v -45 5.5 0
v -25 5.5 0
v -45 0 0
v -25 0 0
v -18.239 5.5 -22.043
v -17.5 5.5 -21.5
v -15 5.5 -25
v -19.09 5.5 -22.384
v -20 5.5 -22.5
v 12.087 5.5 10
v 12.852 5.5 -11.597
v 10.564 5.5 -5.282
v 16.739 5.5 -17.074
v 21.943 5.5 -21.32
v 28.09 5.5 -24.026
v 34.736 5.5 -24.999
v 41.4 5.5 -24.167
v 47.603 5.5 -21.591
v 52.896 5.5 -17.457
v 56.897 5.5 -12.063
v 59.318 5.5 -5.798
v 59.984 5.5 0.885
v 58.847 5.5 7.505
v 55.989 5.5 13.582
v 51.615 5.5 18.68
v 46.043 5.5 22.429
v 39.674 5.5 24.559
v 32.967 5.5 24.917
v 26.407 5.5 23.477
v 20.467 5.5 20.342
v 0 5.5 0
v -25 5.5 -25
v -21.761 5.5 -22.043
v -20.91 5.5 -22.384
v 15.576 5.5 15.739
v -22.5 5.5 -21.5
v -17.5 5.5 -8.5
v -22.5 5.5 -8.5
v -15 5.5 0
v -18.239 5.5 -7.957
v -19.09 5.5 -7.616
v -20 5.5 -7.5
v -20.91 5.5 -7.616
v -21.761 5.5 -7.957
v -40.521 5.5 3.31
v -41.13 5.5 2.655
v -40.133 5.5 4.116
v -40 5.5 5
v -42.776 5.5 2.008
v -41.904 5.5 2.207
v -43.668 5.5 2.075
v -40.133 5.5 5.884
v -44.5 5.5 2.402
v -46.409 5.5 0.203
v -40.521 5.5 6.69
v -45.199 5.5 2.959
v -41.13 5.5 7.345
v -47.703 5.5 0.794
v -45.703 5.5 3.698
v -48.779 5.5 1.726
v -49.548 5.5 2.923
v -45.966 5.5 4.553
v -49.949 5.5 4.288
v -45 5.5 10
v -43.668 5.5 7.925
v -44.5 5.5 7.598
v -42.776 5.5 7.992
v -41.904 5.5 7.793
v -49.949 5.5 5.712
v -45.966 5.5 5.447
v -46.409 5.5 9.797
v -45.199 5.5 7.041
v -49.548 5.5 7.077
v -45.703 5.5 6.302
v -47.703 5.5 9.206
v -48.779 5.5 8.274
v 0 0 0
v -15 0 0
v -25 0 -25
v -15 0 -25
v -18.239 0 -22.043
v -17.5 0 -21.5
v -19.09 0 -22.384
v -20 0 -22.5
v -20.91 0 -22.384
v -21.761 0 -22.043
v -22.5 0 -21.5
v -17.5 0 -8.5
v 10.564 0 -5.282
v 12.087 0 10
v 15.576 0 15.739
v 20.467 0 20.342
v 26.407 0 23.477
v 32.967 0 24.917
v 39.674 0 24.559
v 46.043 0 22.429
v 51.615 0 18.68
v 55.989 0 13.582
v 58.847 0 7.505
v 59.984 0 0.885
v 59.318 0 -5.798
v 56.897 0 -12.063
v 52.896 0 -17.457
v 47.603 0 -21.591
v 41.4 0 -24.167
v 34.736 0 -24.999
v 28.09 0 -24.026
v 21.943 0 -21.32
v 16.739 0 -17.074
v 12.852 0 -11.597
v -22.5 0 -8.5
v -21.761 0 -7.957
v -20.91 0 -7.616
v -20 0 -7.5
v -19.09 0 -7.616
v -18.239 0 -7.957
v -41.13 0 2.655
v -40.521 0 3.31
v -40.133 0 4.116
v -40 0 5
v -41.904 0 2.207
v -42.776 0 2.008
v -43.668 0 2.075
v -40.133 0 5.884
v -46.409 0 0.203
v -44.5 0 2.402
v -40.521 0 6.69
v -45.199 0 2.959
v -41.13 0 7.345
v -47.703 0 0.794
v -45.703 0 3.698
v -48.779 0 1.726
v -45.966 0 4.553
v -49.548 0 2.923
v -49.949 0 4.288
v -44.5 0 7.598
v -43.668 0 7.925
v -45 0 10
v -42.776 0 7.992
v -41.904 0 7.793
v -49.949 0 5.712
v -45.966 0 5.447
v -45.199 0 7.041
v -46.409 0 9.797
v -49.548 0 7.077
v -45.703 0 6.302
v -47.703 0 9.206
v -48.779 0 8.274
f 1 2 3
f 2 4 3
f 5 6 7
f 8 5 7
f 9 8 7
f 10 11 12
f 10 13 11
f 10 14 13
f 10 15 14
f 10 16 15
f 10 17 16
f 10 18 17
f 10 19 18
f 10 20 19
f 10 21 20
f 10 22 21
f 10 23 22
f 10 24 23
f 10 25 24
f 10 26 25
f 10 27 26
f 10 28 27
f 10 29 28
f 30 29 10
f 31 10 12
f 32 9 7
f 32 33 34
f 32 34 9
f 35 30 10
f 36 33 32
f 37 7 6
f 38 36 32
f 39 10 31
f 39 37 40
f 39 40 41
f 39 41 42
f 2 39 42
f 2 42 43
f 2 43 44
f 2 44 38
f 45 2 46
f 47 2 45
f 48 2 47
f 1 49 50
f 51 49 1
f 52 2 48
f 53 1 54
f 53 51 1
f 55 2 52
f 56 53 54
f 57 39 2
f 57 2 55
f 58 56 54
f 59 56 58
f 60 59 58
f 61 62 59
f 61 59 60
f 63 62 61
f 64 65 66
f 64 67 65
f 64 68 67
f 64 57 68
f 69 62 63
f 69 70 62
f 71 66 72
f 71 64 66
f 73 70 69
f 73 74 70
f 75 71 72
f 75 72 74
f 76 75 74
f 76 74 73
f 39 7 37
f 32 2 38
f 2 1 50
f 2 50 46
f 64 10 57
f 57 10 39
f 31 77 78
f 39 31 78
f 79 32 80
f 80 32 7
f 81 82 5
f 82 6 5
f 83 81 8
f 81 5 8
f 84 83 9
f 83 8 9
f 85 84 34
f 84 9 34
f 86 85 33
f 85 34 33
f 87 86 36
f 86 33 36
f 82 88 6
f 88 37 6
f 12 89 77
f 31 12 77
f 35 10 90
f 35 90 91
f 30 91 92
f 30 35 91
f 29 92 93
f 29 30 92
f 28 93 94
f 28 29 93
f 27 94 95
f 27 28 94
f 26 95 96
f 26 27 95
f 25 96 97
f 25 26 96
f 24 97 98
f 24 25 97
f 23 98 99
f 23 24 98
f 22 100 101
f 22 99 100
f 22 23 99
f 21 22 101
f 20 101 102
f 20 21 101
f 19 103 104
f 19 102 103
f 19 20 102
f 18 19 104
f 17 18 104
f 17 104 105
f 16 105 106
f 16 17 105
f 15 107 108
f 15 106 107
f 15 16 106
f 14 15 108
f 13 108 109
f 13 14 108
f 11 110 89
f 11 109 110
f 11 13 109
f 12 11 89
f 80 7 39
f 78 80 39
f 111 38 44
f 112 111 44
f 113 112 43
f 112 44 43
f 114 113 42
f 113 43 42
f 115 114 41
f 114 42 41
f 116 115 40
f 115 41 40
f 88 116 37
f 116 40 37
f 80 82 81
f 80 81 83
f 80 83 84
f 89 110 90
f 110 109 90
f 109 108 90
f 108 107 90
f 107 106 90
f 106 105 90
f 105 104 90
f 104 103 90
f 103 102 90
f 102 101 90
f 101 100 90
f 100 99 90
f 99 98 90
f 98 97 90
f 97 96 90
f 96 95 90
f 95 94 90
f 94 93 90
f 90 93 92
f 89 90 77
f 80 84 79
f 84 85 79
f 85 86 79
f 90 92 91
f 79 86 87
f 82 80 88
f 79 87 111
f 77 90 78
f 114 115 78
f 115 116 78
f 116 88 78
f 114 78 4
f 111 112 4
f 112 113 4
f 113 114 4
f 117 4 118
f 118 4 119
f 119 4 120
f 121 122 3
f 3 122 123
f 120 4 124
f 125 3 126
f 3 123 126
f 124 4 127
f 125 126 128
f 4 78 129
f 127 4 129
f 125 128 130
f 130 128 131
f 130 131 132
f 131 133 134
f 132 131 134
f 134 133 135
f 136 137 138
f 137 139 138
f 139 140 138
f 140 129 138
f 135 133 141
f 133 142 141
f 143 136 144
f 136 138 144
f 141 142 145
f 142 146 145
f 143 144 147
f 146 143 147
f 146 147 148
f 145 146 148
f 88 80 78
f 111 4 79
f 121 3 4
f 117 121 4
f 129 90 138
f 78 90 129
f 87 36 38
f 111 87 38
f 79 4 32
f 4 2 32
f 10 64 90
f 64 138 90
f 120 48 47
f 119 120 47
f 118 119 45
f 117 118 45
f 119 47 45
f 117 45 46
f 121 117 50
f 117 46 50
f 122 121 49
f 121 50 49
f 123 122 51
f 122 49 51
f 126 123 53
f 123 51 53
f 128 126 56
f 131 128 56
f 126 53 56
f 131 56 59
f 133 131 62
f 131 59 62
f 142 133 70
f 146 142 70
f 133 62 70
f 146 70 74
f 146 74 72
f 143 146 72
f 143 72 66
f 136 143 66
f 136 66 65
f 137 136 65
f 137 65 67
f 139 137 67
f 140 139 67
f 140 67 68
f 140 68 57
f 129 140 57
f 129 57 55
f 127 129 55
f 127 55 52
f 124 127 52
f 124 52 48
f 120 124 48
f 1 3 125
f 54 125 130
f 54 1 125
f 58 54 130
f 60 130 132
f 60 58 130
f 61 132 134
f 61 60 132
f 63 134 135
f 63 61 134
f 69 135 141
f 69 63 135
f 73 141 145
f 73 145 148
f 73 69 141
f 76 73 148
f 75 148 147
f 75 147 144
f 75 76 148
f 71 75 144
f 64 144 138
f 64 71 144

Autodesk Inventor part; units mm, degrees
ref_plane "YZ Plane" through (0, 0, 0) normal (1, 0, 0) x (0, 1, 0)
ref_plane "XZ Plane" through (0, 0, 0) normal (0, 1, 0) x (-1, 0, 0)
ref_plane "XY Plane" through (0, 0, 0) normal (0, 0, 1) x (1, 0, 0)
sketch "Boceto1" plane through (0, 0, 0) normal (0, 1, 0) x (-1, 0, 0)
  line L0 (50, 10) -> (-50, 10)
  line L1 (-50, 10) -> (-50, -10)
  line L2 (-50, -10) -> (50, -10)
  line L3 (50, -10) -> (50, 10)
  line L4 (50, 10) -> (-50, -10) construction
  line L5 (-50, 10) -> (50, -10) construction
  line L6 (-50, -10) -> (-20, -10)
  line L7 (-20, -10) -> (0, 0)
  line L8 (0, 0) -> (50, 0)
  line L9 (0, 0) -> (0, 10)
  dimension "d0" = 100
  dimension "d1" = 20
  dimension "d2" = 30
extrude "Extrusión1" add sketch "Boceto1" along normal blind 5.5 contours L3 L8 L9 L0
extrude "Extrusión2" add sketch "Boceto1" along normal blind 5.5 contours L9 L7 L2 L1 L0
sketch "Boceto2" plane through (0, 5.5, 0) normal (0, 1, 0) x (1, 0, 0)
  line L0 (-50, 0) -> (-50, -10) projected
  line L1 (-50, -10) -> (-45, -10)
  line L2 (-50, -10) -> (50, -10) projected
  line L3 (-45, -10) -> (-45, 0)
  line L4 (0, 0) -> (-50, 0) projected
  arc A0 (-45, 0) -> (-45, -10) centre (-45, -5) ccw
  line L5 (-50, -5) -> (-25, -5)
  line L6 (-25, -5) -> (-25, 25)
  line L7 (-25, 25) -> (-15, 25)
  line L8 (-15, 25) -> (-15, -5)
  line L9 (-15, -5) -> (-25, -5)
  line L10 (-20, 25) -> (-20, 5)
  line L11 (-22.5, 7.5) -> (-17.5, 7.5)
  line L12 (-17.5, 7.5) -> (-17.5, 22.5)
  line L13 (-17.5, 22.5) -> (-22.5, 22.5)
  line L14 (-22.5, 22.5) -> (-22.5, 7.5)
  line L15 (-22.5, 7.5) -> (-17.5, 22.5) construction
  line L16 (-17.5, 7.5) -> (-22.5, 22.5) construction
  line L17 (-22.5, 22.5) -> (-22.5, 21.5)
  line L18 (-22.5, 21.5) -> (-17.5, 21.5)
  line L19 (-22.5, 15) -> (-17.5, 15)
  arc A1 (-17.5, 21.5) -> (-22.5, 21.5) centre (-20, 18.875) ccw
  arc A2 (-22.5, 8.5) -> (-17.5, 8.5) centre (-20, 11.125) ccw
  line L20 (-25, -5) -> (-20, -5)
  line L21 (-20, -5) -> (-20, -10)
  line L22 (-20, -10) -> (-25, -10)
  line L23 (-25, -10) -> (-25, -5)
  point P0 (0, -10)
  point P1 (-20, 15)
  point P2 (-50, -5)
  point P3 (-25, 0)
  point P4 (-15, 0)
  point P5 (-20, 22.5)
  point P6 (-20, 7.5)
  point P7 (-22.5, 8.5)
  point P8 (-17.5, 8.5)
  point P9 (-20, -5)
  dimension "d7" = 5
  dimension "d8" = 25
  dimension "d9" = 30
  dimension "d10" = 10
  dimension "d11" = 20
  dimension "d12" = 5
  dimension "d13" = 15
  dimension "d14" = 1
extrude "Extrusión3" cut sketch "Boceto2" against normal blind 5.5 contours L4 A0 L0 | A0 L1 L0
extrude "Extrusión4" add sketch "Boceto2" against normal blind 5.5 contours L6 L7 L8 L4 | L4 L8 L9 L6
extrude "Extrusión5" add sketch "Boceto2" against normal blind 5.5 contours A1 L14 L13 | L13 L12 A1 | A2 L12 L11 | L11 L14 A2
sketch "Boceto3" plane through (0, 5.5, 0) normal (0, 1, 0) x (1, 0, 0)
  arc A0 (-45, 0) -> (-45, -10) centre (-45, -5) ccw projected
  line L0 (-45, -5) -> (-43, -5)
  circle A1 centre (-43, -5) radius 3
  point P0 (0, 0)
  dimension "d21" = 2
  dimension "d22" = 6
extrude "Extrusión6" cut sketch "Boceto3" against normal blind 5.5
sketch "Boceto4" plane through (0, 5.5, 0) normal (0, 1, 0) x (1, 0, 0)
  line L0 (0, 0) -> (50, 0)
  line L1 (50, -10) -> (50, 10) projected
  line L2 (50, 10) -> (20, 10) projected
  line L3 (20, 10) -> (20, 0)
  line L4 (50, 0) -> (20, 0)
  circle A0 centre (35, 0) radius 25
  dimension "d27" = 50
extrude "Extrusión7" add sketch "Boceto4" against normal blind 5.5
sketch "Boceto5" plane through (0, 5.5, 0) normal (0, 1, 0) x (1, 0, 0)
  line L0 (-22.5, 8.5) -> (-22.5, 21.5) projected
  arc A0 (-22.5, 8.5) -> (-17.5, 8.5) centre (-20, 11.125) ccw projected
  line L1 (-17.5, 21.5) -> (-17.5, 8.5) projected
  circle A1 centre (-43, -5) radius 3 projected
  line L2 (-43, -5) -> (-20, -5)
  line L3 (-20, -5) -> (-20, 11.125)
  line L4 (-20, 11.125) -> (-43, -5)
  line L5 (-22.5, 13.75) -> (-17.5, 13.75)
  point P0 (0, 0)
properties part number "PINZA_D"
